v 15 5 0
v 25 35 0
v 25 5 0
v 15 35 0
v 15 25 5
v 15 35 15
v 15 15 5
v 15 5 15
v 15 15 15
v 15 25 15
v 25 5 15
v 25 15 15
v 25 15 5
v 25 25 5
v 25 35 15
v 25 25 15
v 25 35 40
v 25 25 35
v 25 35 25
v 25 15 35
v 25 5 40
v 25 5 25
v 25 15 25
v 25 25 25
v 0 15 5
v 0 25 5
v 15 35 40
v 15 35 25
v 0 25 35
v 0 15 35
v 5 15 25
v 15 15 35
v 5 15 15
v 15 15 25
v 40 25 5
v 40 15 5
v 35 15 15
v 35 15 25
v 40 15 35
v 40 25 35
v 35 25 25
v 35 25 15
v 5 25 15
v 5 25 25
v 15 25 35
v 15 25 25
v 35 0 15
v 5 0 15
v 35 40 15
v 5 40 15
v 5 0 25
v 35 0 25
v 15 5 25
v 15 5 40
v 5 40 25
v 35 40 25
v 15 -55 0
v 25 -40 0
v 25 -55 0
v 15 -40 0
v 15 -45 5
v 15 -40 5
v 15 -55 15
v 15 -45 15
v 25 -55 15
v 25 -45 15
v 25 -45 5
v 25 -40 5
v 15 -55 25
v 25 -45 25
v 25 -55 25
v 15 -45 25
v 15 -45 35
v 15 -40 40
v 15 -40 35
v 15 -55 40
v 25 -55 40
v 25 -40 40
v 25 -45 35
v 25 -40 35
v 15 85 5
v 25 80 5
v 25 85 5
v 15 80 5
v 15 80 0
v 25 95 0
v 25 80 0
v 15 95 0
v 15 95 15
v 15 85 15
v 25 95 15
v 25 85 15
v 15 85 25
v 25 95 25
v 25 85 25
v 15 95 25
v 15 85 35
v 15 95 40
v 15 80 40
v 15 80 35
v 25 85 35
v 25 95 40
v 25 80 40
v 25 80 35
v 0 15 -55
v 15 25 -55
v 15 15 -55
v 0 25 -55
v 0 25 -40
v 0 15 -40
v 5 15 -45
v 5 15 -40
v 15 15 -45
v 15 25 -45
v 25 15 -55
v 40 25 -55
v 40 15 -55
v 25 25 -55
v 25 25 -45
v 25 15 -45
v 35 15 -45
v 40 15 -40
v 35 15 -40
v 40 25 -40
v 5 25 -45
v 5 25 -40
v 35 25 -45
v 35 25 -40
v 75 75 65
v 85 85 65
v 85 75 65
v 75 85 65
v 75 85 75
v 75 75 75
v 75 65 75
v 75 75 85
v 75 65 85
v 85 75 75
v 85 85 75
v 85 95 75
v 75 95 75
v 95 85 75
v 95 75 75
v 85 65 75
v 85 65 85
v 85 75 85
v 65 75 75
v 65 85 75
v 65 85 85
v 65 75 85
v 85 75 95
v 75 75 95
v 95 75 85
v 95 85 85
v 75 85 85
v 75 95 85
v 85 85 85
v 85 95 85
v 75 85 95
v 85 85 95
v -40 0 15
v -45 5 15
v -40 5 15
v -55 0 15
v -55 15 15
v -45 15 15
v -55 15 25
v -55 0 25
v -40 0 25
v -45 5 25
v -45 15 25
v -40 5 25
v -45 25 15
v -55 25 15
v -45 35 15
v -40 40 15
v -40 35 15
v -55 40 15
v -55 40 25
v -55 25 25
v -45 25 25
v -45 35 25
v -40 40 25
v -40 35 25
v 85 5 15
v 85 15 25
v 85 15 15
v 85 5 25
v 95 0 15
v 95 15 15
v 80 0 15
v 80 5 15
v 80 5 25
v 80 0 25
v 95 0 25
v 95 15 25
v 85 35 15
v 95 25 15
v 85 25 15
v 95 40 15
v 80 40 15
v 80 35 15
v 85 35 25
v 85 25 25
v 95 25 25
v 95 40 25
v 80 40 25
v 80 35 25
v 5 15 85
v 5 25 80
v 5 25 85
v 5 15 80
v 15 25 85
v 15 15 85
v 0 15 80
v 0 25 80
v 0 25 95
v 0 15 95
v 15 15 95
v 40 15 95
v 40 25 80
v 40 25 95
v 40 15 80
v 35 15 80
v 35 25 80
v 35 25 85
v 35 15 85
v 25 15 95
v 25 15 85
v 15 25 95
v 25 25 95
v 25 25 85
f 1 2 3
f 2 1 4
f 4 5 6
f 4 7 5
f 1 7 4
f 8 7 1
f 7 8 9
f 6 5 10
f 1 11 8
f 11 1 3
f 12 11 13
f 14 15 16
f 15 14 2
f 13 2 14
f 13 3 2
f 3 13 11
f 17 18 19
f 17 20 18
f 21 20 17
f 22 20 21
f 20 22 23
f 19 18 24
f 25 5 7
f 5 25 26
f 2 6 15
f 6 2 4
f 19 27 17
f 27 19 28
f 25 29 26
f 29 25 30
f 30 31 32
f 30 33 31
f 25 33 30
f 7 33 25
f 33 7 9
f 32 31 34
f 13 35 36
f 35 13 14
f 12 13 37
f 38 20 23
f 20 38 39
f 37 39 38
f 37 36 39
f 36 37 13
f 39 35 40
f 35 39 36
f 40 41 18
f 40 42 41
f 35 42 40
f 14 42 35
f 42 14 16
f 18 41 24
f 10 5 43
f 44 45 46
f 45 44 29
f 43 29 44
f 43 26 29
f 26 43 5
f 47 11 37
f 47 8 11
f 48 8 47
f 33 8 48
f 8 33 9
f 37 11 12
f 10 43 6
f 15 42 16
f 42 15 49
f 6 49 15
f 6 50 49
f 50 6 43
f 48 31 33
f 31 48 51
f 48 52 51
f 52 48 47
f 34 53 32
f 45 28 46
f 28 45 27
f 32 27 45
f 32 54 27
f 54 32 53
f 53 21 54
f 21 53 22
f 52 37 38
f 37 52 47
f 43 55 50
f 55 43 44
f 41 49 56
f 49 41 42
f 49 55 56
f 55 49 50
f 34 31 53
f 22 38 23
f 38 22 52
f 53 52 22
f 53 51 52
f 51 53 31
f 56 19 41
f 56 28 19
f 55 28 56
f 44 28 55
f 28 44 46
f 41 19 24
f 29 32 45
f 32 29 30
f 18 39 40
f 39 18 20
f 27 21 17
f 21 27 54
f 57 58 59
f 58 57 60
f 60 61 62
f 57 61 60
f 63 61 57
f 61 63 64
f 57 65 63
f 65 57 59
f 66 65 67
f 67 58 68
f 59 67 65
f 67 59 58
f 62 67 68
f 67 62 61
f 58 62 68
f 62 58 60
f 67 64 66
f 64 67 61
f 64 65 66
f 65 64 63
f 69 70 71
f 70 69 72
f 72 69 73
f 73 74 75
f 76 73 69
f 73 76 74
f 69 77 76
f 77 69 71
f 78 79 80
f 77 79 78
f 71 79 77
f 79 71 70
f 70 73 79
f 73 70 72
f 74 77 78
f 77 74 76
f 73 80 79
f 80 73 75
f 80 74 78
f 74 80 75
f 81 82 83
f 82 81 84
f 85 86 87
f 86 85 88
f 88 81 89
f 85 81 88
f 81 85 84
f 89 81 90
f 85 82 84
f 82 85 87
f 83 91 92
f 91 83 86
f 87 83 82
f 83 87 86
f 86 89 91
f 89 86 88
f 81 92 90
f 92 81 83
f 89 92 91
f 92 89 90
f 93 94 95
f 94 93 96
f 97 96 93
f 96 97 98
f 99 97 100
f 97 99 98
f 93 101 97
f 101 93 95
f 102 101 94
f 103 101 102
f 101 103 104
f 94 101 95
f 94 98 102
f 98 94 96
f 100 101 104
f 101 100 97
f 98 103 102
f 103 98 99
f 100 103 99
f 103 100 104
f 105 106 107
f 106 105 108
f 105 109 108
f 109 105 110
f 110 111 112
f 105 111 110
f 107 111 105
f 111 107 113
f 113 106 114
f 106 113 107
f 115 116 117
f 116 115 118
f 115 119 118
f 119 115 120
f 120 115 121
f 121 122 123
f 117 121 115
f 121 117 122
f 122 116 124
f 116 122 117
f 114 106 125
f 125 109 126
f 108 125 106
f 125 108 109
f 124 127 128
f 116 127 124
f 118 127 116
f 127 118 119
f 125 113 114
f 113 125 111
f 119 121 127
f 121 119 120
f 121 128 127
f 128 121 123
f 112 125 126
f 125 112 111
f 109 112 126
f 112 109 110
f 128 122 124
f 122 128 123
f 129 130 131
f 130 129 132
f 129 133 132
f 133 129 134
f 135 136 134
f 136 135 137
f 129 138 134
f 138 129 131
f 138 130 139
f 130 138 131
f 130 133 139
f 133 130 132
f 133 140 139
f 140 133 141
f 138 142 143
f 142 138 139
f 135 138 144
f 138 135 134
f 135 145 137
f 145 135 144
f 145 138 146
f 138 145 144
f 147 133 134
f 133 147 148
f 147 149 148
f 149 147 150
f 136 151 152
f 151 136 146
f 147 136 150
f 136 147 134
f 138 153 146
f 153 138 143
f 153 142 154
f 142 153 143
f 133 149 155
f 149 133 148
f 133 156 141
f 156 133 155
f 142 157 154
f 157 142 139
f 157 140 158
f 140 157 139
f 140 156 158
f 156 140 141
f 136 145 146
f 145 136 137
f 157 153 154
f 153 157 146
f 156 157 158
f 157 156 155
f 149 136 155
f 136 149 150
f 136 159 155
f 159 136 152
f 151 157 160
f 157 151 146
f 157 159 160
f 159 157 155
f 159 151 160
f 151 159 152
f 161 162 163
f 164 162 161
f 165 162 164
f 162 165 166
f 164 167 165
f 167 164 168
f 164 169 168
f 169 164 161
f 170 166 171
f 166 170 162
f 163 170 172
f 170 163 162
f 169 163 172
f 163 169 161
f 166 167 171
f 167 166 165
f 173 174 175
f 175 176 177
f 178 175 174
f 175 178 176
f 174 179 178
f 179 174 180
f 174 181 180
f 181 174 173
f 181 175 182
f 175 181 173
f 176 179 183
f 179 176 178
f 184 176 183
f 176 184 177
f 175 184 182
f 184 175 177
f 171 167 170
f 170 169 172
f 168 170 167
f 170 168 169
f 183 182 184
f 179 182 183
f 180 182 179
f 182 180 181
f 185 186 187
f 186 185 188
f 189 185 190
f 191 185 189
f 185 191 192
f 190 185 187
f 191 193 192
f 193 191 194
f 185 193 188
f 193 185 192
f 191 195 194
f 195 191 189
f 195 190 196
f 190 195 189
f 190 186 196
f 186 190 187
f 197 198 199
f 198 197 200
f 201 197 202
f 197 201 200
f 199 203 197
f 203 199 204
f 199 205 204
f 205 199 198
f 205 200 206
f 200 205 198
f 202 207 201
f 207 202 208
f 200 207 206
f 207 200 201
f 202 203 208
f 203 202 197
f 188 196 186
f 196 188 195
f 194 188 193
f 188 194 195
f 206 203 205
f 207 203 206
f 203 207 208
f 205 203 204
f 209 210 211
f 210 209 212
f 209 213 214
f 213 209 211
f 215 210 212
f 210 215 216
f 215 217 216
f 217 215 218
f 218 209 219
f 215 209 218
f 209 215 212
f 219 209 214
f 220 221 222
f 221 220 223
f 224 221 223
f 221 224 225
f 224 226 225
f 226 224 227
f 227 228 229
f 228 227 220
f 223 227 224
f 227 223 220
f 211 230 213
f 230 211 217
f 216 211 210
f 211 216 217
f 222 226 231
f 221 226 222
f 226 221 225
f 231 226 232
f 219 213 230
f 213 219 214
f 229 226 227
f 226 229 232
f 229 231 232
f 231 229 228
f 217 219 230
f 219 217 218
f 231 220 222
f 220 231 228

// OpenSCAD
// SCAD file for Six Piece Burr Puzzle
// 整体模型
union() {
  translate([15, 5, 0]) color([0, 0.8, 0, 0.85]) cube([5, 5, 5]);
  translate([20, 5, 0]) color([0, 0.8, 0, 0.85]) cube([5, 5, 5]);
  translate([15, 10, 0]) color([0, 0.8, 0, 0.85]) cube([5, 5, 5]);
  translate([20, 10, 0]) color([0, 0.8, 0, 0.85]) cube([5, 5, 5]);
  translate([15, 15, 0]) color([0, 0.8, 0, 0.85]) cube([5, 5, 5]);
  translate([20, 15, 0]) color([0, 0.8, 0, 0.85]) cube([5, 5, 5]);
  translate([15, 20, 0]) color([1, 0, 0, 0.85]) cube([5, 5, 5]);
  translate([20, 20, 0]) color([1, 0, 0, 0.85]) cube([5, 5, 5]);
  translate([15, 25, 0]) color([1, 0, 0, 0.85]) cube([5, 5, 5]);
  translate([20, 25, 0]) color([1, 0, 0, 0.85]) cube([5, 5, 5]);
  translate([15, 30, 0]) color([1, 0, 0, 0.85]) cube([5, 5, 5]);
  translate([20, 30, 0]) color([1, 0, 0, 0.85]) cube([5, 5, 5]);
  translate([15, 5, 5]) color([0, 0.8, 0, 0.85]) cube([5, 5, 5]);
  translate([20, 5, 5]) color([0, 0.8, 0, 0.85]) cube([5, 5, 5]);
  translate([15, 10, 5]) color([0, 0.8, 0, 0.85]) cube([5, 5, 5]);
  translate([20, 10, 5]) color([0, 0.8, 0, 0.85]) cube([5, 5, 5]);
  translate([0, 15, 5]) color([1, 0.8, 0, 0.85]) cube([5, 5, 5]);
  translate([5, 15, 5]) color([1, 0.8, 0, 0.85]) cube([5, 5, 5]);
  translate([10, 15, 5]) color([1, 0.8, 0, 0.85]) cube([5, 5, 5]);
  translate([15, 15, 5]) color([0.8, 0.8, 0.8, 0.85]) cube([5, 5, 5]);
  translate([20, 15, 5]) color([0.8, 0.8, 0.8, 0.85]) cube([5, 5, 5]);
  translate([25, 15, 5]) color([1, 0.8, 0, 0.85]) cube([5, 5, 5]);
  translate([30, 15, 5]) color([1, 0.8, 0, 0.85]) cube([5, 5, 5]);
  translate([35, 15, 5]) color([1, 0.8, 0, 0.85]) cube([5, 5, 5]);
  translate([0, 20, 5]) color([1, 0.8, 0, 0.85]) cube([5, 5, 5]);
  translate([5, 20, 5]) color([1, 0.8, 0, 0.85]) cube([5, 5, 5]);
  translate([10, 20, 5]) color([1, 0.8, 0, 0.85]) cube([5, 5, 5]);
  translate([15, 20, 5]) color([0.8, 0.8, 0.8, 0.85]) cube([5, 5, 5]);
  translate([20, 20, 5]) color([0.8, 0.8, 0.8, 0.85]) cube([5, 5, 5]);
  translate([25, 20, 5]) color([1, 0.8, 0, 0.85]) cube([5, 5, 5]);
  translate([30, 20, 5]) color([1, 0.8, 0, 0.85]) cube([5, 5, 5]);
  translate([35, 20, 5]) color([1, 0.8, 0, 0.85]) cube([5, 5, 5]);
  translate([15, 25, 5]) color([1, 0, 0, 0.85]) cube([5, 5, 5]);
  translate([20, 25, 5]) color([1, 0, 0, 0.85]) cube([5, 5, 5]);
  translate([15, 30, 5]) color([1, 0, 0, 0.85]) cube([5, 5, 5]);
  translate([20, 30, 5]) color([1, 0, 0, 0.85]) cube([5, 5, 5]);
  translate([15, 5, 10]) color([0, 0.8, 0, 0.85]) cube([5, 5, 5]);
  translate([20, 5, 10]) color([0, 0.8, 0, 0.85]) cube([5, 5, 5]);
  translate([15, 10, 10]) color([0, 0.8, 0, 0.85]) cube([5, 5, 5]);
  translate([20, 10, 10]) color([0, 0.8, 0, 0.85]) cube([5, 5, 5]);
  translate([0, 15, 10]) color([1, 0.8, 0, 0.85]) cube([5, 5, 5]);
  translate([5, 15, 10]) color([1, 0.8, 0, 0.85]) cube([5, 5, 5]);
  translate([10, 15, 10]) color([1, 0.8, 0, 0.85]) cube([5, 5, 5]);
  translate([15, 15, 10]) color([0.8, 0.8, 0.8, 0.85]) cube([5, 5, 5]);
  translate([20, 15, 10]) color([0.8, 0.8, 0.8, 0.85]) cube([5, 5, 5]);
  translate([25, 15, 10]) color([1, 0.8, 0, 0.85]) cube([5, 5, 5]);
  translate([30, 15, 10]) color([1, 0.8, 0, 0.85]) cube([5, 5, 5]);
  translate([35, 15, 10]) color([1, 0.8, 0, 0.85]) cube([5, 5, 5]);
  translate([0, 20, 10]) color([1, 0.8, 0, 0.85]) cube([5, 5, 5]);
  translate([5, 20, 10]) color([1, 0.8, 0, 0.85]) cube([5, 5, 5]);
  translate([10, 20, 10]) color([1, 0.8, 0, 0.85]) cube([5, 5, 5]);
  translate([15, 20, 10]) color([0.8, 0.8, 0.8, 0.85]) cube([5, 5, 5]);
  translate([20, 20, 10]) color([0.8, 0.8, 0.8, 0.85]) cube([5, 5, 5]);
  translate([25, 20, 10]) color([1, 0.8, 0, 0.85]) cube([5, 5, 5]);
  translate([30, 20, 10]) color([1, 0.8, 0, 0.85]) cube([5, 5, 5]);
  translate([35, 20, 10]) color([1, 0.8, 0, 0.85]) cube([5, 5, 5]);
  translate([15, 25, 10]) color([1, 0, 0, 0.85]) cube([5, 5, 5]);
  translate([20, 25, 10]) color([1, 0, 0, 0.85]) cube([5, 5, 5]);
  translate([15, 30, 10]) color([1, 0, 0, 0.85]) cube([5, 5, 5]);
  translate([20, 30, 10]) color([1, 0, 0, 0.85]) cube([5, 5, 5]);
  translate([5, 0, 15]) color([0.6, 0, 1, 0.85]) cube([5, 5, 5]);
  translate([10, 0, 15]) color([0.6, 0, 1, 0.85]) cube([5, 5, 5]);
  translate([15, 0, 15]) color([0.6, 0, 1, 0.85]) cube([5, 5, 5]);
  translate([20, 0, 15]) color([1, 0.4, 0, 0.85]) cube([5, 5, 5]);
  translate([25, 0, 15]) color([1, 0.4, 0, 0.85]) cube([5, 5, 5]);
  translate([30, 0, 15]) color([1, 0.4, 0, 0.85]) cube([5, 5, 5]);
  translate([5, 5, 15]) color([0.6, 0, 1, 0.85]) cube([5, 5, 5]);
  translate([10, 5, 15]) color([0.6, 0, 1, 0.85]) cube([5, 5, 5]);
  translate([15, 5, 15]) color([0.8, 0.8, 0.8, 0.85]) cube([5, 5, 5]);
  translate([20, 5, 15]) color([0.8, 0.8, 0.8, 0.85]) cube([5, 5, 5]);
  translate([25, 5, 15]) color([1, 0.4, 0, 0.85]) cube([5, 5, 5]);
  translate([30, 5, 15]) color([1, 0.4, 0, 0.85]) cube([5, 5, 5]);
  translate([5, 10, 15]) color([0.6, 0, 1, 0.85]) cube([5, 5, 5]);
  translate([10, 10, 15]) color([0.6, 0, 1, 0.85]) cube([5, 5, 5]);
  translate([15, 10, 15]) color([0.8, 0.8, 0.8, 0.85]) cube([5, 5, 5]);
  translate([20, 10, 15]) color([0.8, 0.8, 0.8, 0.85]) cube([5, 5, 5]);
  translate([25, 10, 15]) color([1, 0.4, 0, 0.85]) cube([5, 5, 5]);
  translate([30, 10, 15]) color([1, 0.4, 0, 0.85]) cube([5, 5, 5]);
  translate([0, 15, 15]) color([1, 0.8, 0, 0.85]) cube([5, 5, 5]);
  translate([5, 15, 15]) color([0.8, 0.8, 0.8, 0.85]) cube([5, 5, 5]);
  translate([10, 15, 15]) color([0.8, 0.8, 0.8, 0.85]) cube([5, 5, 5]);
  translate([15, 15, 15]) color([0.8, 0.8, 0.8, 0.85]) cube([5, 5, 5]);
  translate([20, 15, 15]) color([0.8, 0.8, 0.8, 0.85]) cube([5, 5, 5]);
  translate([25, 15, 15]) color([0.8, 0.8, 0.8, 0.85]) cube([5, 5, 5]);
  translate([30, 15, 15]) color([0.8, 0.8, 0.8, 0.85]) cube([5, 5, 5]);
  translate([35, 15, 15]) color([1, 0.8, 0, 0.85]) cube([5, 5, 5]);
  translate([0, 20, 15]) color([1, 0.8, 0, 0.85]) cube([5, 5, 5]);
  translate([5, 20, 15]) color([0.8, 0.8, 0.8, 0.85]) cube([5, 5, 5]);
  translate([10, 20, 15]) color([0.8, 0.8, 0.8, 0.85]) cube([5, 5, 5]);
  translate([15, 20, 15]) color([0.8, 0.8, 0.8, 0.85]) cube([5, 5, 5]);
  translate([20, 20, 15]) color([0.8, 0.8, 0.8, 0.85]) cube([5, 5, 5]);
  translate([25, 20, 15]) color([0.8, 0.8, 0.8, 0.85]) cube([5, 5, 5]);
  translate([30, 20, 15]) color([0.8, 0.8, 0.8, 0.85]) cube([5, 5, 5]);
  translate([35, 20, 15]) color([1, 0.8, 0, 0.85]) cube([5, 5, 5]);
  translate([5, 25, 15]) color([0.6, 0, 1, 0.85]) cube([5, 5, 5]);
  translate([10, 25, 15]) color([0.6, 0, 1, 0.85]) cube([5, 5, 5]);
  translate([15, 25, 15]) color([0.8, 0.8, 0.8, 0.85]) cube([5, 5, 5]);
  translate([20, 25, 15]) color([0.8, 0.8, 0.8, 0.85]) cube([5, 5, 5]);
  translate([25, 25, 15]) color([1, 0.4, 0, 0.85]) cube([5, 5, 5]);
  translate([30, 25, 15]) color([1, 0.4, 0, 0.85]) cube([5, 5, 5]);
  translate([5, 30, 15]) color([0.6, 0, 1, 0.85]) cube([5, 5, 5]);
  translate([10, 30, 15]) color([0.6, 0, 1, 0.85]) cube([5, 5, 5]);
  translate([15, 30, 15]) color([0.8, 0.8, 0.8, 0.85]) cube([5, 5, 5]);
  translate([20, 30, 15]) color([0.8, 0.8, 0.8, 0.85]) cube([5, 5, 5]);
  translate([25, 30, 15]) color([1, 0.4, 0, 0.85]) cube([5, 5, 5]);
  translate([30, 30, 15]) color([1, 0.4, 0, 0.85]) cube([5, 5, 5]);
  translate([5, 35, 15]) color([0.6, 0, 1, 0.85]) cube([5, 5, 5]);
  translate([10, 35, 15]) color([0.6, 0, 1, 0.85]) cube([5, 5, 5]);
  translate([15, 35, 15]) color([0.6, 0, 1, 0.85]) cube([5, 5, 5]);
  translate([20, 35, 15]) color([1, 0.4, 0, 0.85]) cube([5, 5, 5]);
  translate([25, 35, 15]) color([1, 0.4, 0, 0.85]) cube([5, 5, 5]);
  translate([30, 35, 15]) color([1, 0.4, 0, 0.85]) cube([5, 5, 5]);
  translate([5, 0, 20]) color([0.6, 0, 1, 0.85]) cube([5, 5, 5]);
  translate([10, 0, 20]) color([0.6, 0, 1, 0.85]) cube([5, 5, 5]);
  translate([15, 0, 20]) color([0.6, 0, 1, 0.85]) cube([5, 5, 5]);
  translate([20, 0, 20]) color([1, 0.4, 0, 0.85]) cube([5, 5, 5]);
  translate([25, 0, 20]) color([1, 0.4, 0, 0.85]) cube([5, 5, 5]);
  translate([30, 0, 20]) color([1, 0.4, 0, 0.85]) cube([5, 5, 5]);
  translate([5, 5, 20]) color([0.6, 0, 1, 0.85]) cube([5, 5, 5]);
  translate([10, 5, 20]) color([0.6, 0, 1, 0.85]) cube([5, 5, 5]);
  translate([15, 5, 20]) color([0.8, 0.8, 0.8, 0.85]) cube([5, 5, 5]);
  translate([20, 5, 20]) color([0.8, 0.8, 0.8, 0.85]) cube([5, 5, 5]);
  translate([25, 5, 20]) color([1, 0.4, 0, 0.85]) cube([5, 5, 5]);
  translate([30, 5, 20]) color([1, 0.4, 0, 0.85]) cube([5, 5, 5]);
  translate([5, 10, 20]) color([0.6, 0, 1, 0.85]) cube([5, 5, 5]);
  translate([10, 10, 20]) color([0.6, 0, 1, 0.85]) cube([5, 5, 5]);
  translate([15, 10, 20]) color([0.8, 0.8, 0.8, 0.85]) cube([5, 5, 5]);
  translate([20, 10, 20]) color([0.8, 0.8, 0.8, 0.85]) cube([5, 5, 5]);
  translate([25, 10, 20]) color([1, 0.4, 0, 0.85]) cube([5, 5, 5]);
  translate([30, 10, 20]) color([1, 0.4, 0, 0.85]) cube([5, 5, 5]);
  translate([0, 15, 20]) color([0, 0.4, 1, 0.85]) cube([5, 5, 5]);
  translate([5, 15, 20]) color([0.8, 0.8, 0.8, 0.85]) cube([5, 5, 5]);
  translate([10, 15, 20]) color([0.8, 0.8, 0.8, 0.85]) cube([5, 5, 5]);
  translate([15, 15, 20]) color([0.8, 0.8, 0.8, 0.85]) cube([5, 5, 5]);
  translate([20, 15, 20]) color([0.8, 0.8, 0.8, 0.85]) cube([5, 5, 5]);
  translate([25, 15, 20]) color([0.8, 0.8, 0.8, 0.85]) cube([5, 5, 5]);
  translate([30, 15, 20]) color([0.8, 0.8, 0.8, 0.85]) cube([5, 5, 5]);
  translate([35, 15, 20]) color([0, 0.4, 1, 0.85]) cube([5, 5, 5]);
  translate([0, 20, 20]) color([0, 0.4, 1, 0.85]) cube([5, 5, 5]);
  translate([5, 20, 20]) color([0.8, 0.8, 0.8, 0.85]) cube([5, 5, 5]);
  translate([10, 20, 20]) color([0.8, 0.8, 0.8, 0.85]) cube([5, 5, 5]);
  translate([15, 20, 20]) color([0.8, 0.8, 0.8, 0.85]) cube([5, 5, 5]);
  translate([20, 20, 20]) color([0.8, 0.8, 0.8, 0.85]) cube([5, 5, 5]);
  translate([25, 20, 20]) color([0.8, 0.8, 0.8, 0.85]) cube([5, 5, 5]);
  translate([30, 20, 20]) color([0.8, 0.8, 0.8, 0.85]) cube([5, 5, 5]);
  translate([35, 20, 20]) color([0, 0.4, 1, 0.85]) cube([5, 5, 5]);
  translate([5, 25, 20]) color([0.6, 0, 1, 0.85]) cube([5, 5, 5]);
  translate([10, 25, 20]) color([0.6, 0, 1, 0.85]) cube([5, 5, 5]);
  translate([15, 25, 20]) color([0.8, 0.8, 0.8, 0.85]) cube([5, 5, 5]);
  translate([20, 25, 20]) color([0.8, 0.8, 0.8, 0.85]) cube([5, 5, 5]);
  translate([25, 25, 20]) color([1, 0.4, 0, 0.85]) cube([5, 5, 5]);
  translate([30, 25, 20]) color([1, 0.4, 0, 0.85]) cube([5, 5, 5]);
  translate([5, 30, 20]) color([0.6, 0, 1, 0.85]) cube([5, 5, 5]);
  translate([10, 30, 20]) color([0.6, 0, 1, 0.85]) cube([5, 5, 5]);
  translate([15, 30, 20]) color([0.8, 0.8, 0.8, 0.85]) cube([5, 5, 5]);
  translate([20, 30, 20]) color([0.8, 0.8, 0.8, 0.85]) cube([5, 5, 5]);
  translate([25, 30, 20]) color([1, 0.4, 0, 0.85]) cube([5, 5, 5]);
  translate([30, 30, 20]) color([1, 0.4, 0, 0.85]) cube([5, 5, 5]);
  translate([5, 35, 20]) color([0.6, 0, 1, 0.85]) cube([5, 5, 5]);
  translate([10, 35, 20]) color([0.6, 0, 1, 0.85]) cube([5, 5, 5]);
  translate([15, 35, 20]) color([0.6, 0, 1, 0.85]) cube([5, 5, 5]);
  translate([20, 35, 20]) color([1, 0.4, 0, 0.85]) cube([5, 5, 5]);
  translate([25, 35, 20]) color([1, 0.4, 0, 0.85]) cube([5, 5, 5]);
  translate([30, 35, 20]) color([1, 0.4, 0, 0.85]) cube([5, 5, 5]);
  translate([15, 5, 25]) color([0, 0.8, 0, 0.85]) cube([5, 5, 5]);
  translate([20, 5, 25]) color([0, 0.8, 0, 0.85]) cube([5, 5, 5]);
  translate([15, 10, 25]) color([0, 0.8, 0, 0.85]) cube([5, 5, 5]);
  translate([20, 10, 25]) color([0, 0.8, 0, 0.85]) cube([5, 5, 5]);
  translate([0, 15, 25]) color([0, 0.4, 1, 0.85]) cube([5, 5, 5]);
  translate([5, 15, 25]) color([0, 0.4, 1, 0.85]) cube([5, 5, 5]);
  translate([10, 15, 25]) color([0, 0.4, 1, 0.85]) cube([5, 5, 5]);
  translate([15, 15, 25]) color([0.8, 0.8, 0.8, 0.85]) cube([5, 5, 5]);
  translate([20, 15, 25]) color([0.8, 0.8, 0.8, 0.85]) cube([5, 5, 5]);
  translate([25, 15, 25]) color([0, 0.4, 1, 0.85]) cube([5, 5, 5]);
  translate([30, 15, 25]) color([0, 0.4, 1, 0.85]) cube([5, 5, 5]);
  translate([35, 15, 25]) color([0, 0.4, 1, 0.85]) cube([5, 5, 5]);
  translate([0, 20, 25]) color([0, 0.4, 1, 0.85]) cube([5, 5, 5]);
  translate([5, 20, 25]) color([0, 0.4, 1, 0.85]) cube([5, 5, 5]);
  translate([10, 20, 25]) color([0, 0.4, 1, 0.85]) cube([5, 5, 5]);
  translate([15, 20, 25]) color([0.8, 0.8, 0.8, 0.85]) cube([5, 5, 5]);
  translate([20, 20, 25]) color([0.8, 0.8, 0.8, 0.85]) cube([5, 5, 5]);
  translate([25, 20, 25]) color([0, 0.4, 1, 0.85]) cube([5, 5, 5]);
  translate([30, 20, 25]) color([0, 0.4, 1, 0.85]) cube([5, 5, 5]);
  translate([35, 20, 25]) color([0, 0.4, 1, 0.85]) cube([5, 5, 5]);
  translate([15, 25, 25]) color([1, 0, 0, 0.85]) cube([5, 5, 5]);
  translate([20, 25, 25]) color([1, 0, 0, 0.85]) cube([5, 5, 5]);
  translate([15, 30, 25]) color([1, 0, 0, 0.85]) cube([5, 5, 5]);
  translate([20, 30, 25]) color([1, 0, 0, 0.85]) cube([5, 5, 5]);
  translate([15, 5, 30]) color([0, 0.8, 0, 0.85]) cube([5, 5, 5]);
  translate([20, 5, 30]) color([0, 0.8, 0, 0.85]) cube([5, 5, 5]);
  translate([15, 10, 30]) color([0, 0.8, 0, 0.85]) cube([5, 5, 5]);
  translate([20, 10, 30]) color([0, 0.8, 0, 0.85]) cube([5, 5, 5]);
  translate([0, 15, 30]) color([0, 0.4, 1, 0.85]) cube([5, 5, 5]);
  translate([5, 15, 30]) color([0, 0.4, 1, 0.85]) cube([5, 5, 5]);
  translate([10, 15, 30]) color([0, 0.4, 1, 0.85]) cube([5, 5, 5]);
  translate([15, 15, 30]) color([0.8, 0.8, 0.8, 0.85]) cube([5, 5, 5]);
  translate([20, 15, 30]) color([0.8, 0.8, 0.8, 0.85]) cube([5, 5, 5]);
  translate([25, 15, 30]) color([0, 0.4, 1, 0.85]) cube([5, 5, 5]);
  translate([30, 15, 30]) color([0, 0.4, 1, 0.85]) cube([5, 5, 5]);
  translate([35, 15, 30]) color([0, 0.4, 1, 0.85]) cube([5, 5, 5]);
  translate([0, 20, 30]) color([0, 0.4, 1, 0.85]) cube([5, 5, 5]);
  translate([5, 20, 30]) color([0, 0.4, 1, 0.85]) cube([5, 5, 5]);
  translate([10, 20, 30]) color([0, 0.4, 1, 0.85]) cube([5, 5, 5]);
  translate([15, 20, 30]) color([0.8, 0.8, 0.8, 0.85]) cube([5, 5, 5]);
  translate([20, 20, 30]) color([0.8, 0.8, 0.8, 0.85]) cube([5, 5, 5]);
  translate([25, 20, 30]) color([0, 0.4, 1, 0.85]) cube([5, 5, 5]);
  translate([30, 20, 30]) color([0, 0.4, 1, 0.85]) cube([5, 5, 5]);
  translate([35, 20, 30]) color([0, 0.4, 1, 0.85]) cube([5, 5, 5]);
  translate([15, 25, 30]) color([1, 0, 0, 0.85]) cube([5, 5, 5]);
  translate([20, 25, 30]) color([1, 0, 0, 0.85]) cube([5, 5, 5]);
  translate([15, 30, 30]) color([1, 0, 0, 0.85]) cube([5, 5, 5]);
  translate([20, 30, 30]) color([1, 0, 0, 0.85]) cube([5, 5, 5]);
  translate([15, 5, 35]) color([0, 0.8, 0, 0.85]) cube([5, 5, 5]);
  translate([20, 5, 35]) color([0, 0.8, 0, 0.85]) cube([5, 5, 5]);
  translate([15, 10, 35]) color([0, 0.8, 0, 0.85]) cube([5, 5, 5]);
  translate([20, 10, 35]) color([0, 0.8, 0, 0.85]) cube([5, 5, 5]);
  translate([15, 15, 35]) color([0, 0.8, 0, 0.85]) cube([5, 5, 5]);
  translate([20, 15, 35]) color([0, 0.8, 0, 0.85]) cube([5, 5, 5]);
  translate([15, 20, 35]) color([1, 0, 0, 0.85]) cube([5, 5, 5]);
  translate([20, 20, 35]) color([1, 0, 0, 0.85]) cube([5, 5, 5]);
  translate([15, 25, 35]) color([1, 0, 0, 0.85]) cube([5, 5, 5]);
  translate([20, 25, 35]) color([1, 0, 0, 0.85]) cube([5, 5, 5]);
  translate([15, 30, 35]) color([1, 0, 0, 0.85]) cube([5, 5, 5]);
  translate([20, 30, 35]) color([1, 0, 0, 0.85]) cube([5, 5, 5]);
}

// 零件 B
union() {
  translate([15.0, -55.0, 0.0]) color([0, 0.8, 0, 0.85]) cube([5, 5, 5]);
  translate([20.0, -55.0, 0.0]) color([0, 0.8, 0, 0.85]) cube([5, 5, 5]);
  translate([15.0, -50.0, 0.0]) color([0, 0.8, 0, 0.85]) cube([5, 5, 5]);
  translate([20.0, -50.0, 0.0]) color([0, 0.8, 0, 0.85]) cube([5, 5, 5]);
  translate([15.0, -45.0, 0.0]) color([0, 0.8, 0, 0.85]) cube([5, 5, 5]);
  translate([20.0, -45.0, 0.0]) color([0, 0.8, 0, 0.85]) cube([5, 5, 5]);
  translate([15.0, -55.0, 5.0]) color([0, 0.8, 0, 0.85]) cube([5, 5, 5]);
  translate([20.0, -55.0, 5.0]) color([0, 0.8, 0, 0.85]) cube([5, 5, 5]);
  translate([15.0, -50.0, 5.0]) color([0, 0.8, 0, 0.85]) cube([5, 5, 5]);
  translate([20.0, -50.0, 5.0]) color([0, 0.8, 0, 0.85]) cube([5, 5, 5]);
  translate([15.0, -55.0, 10.0]) color([0, 0.8, 0, 0.85]) cube([5, 5, 5]);
  translate([20.0, -55.0, 10.0]) color([0, 0.8, 0, 0.85]) cube([5, 5, 5]);
  translate([15.0, -50.0, 10.0]) color([0, 0.8, 0, 0.85]) cube([5, 5, 5]);
  translate([20.0, -50.0, 10.0]) color([0, 0.8, 0, 0.85]) cube([5, 5, 5]);
  translate([15.0, -55.0, 25.0]) color([0, 0.8, 0, 0.85]) cube([5, 5, 5]);
  translate([20.0, -55.0, 25.0]) color([0, 0.8, 0, 0.85]) cube([5, 5, 5]);
  translate([15.0, -50.0, 25.0]) color([0, 0.8, 0, 0.85]) cube([5, 5, 5]);
  translate([20.0, -50.0, 25.0]) color([0, 0.8, 0, 0.85]) cube([5, 5, 5]);
  translate([15.0, -55.0, 30.0]) color([0, 0.8, 0, 0.85]) cube([5, 5, 5]);
  translate([20.0, -55.0, 30.0]) color([0, 0.8, 0, 0.85]) cube([5, 5, 5]);
  translate([15.0, -50.0, 30.0]) color([0, 0.8, 0, 0.85]) cube([5, 5, 5]);
  translate([20.0, -50.0, 30.0]) color([0, 0.8, 0, 0.85]) cube([5, 5, 5]);
  translate([15.0, -55.0, 35.0]) color([0, 0.8, 0, 0.85]) cube([5, 5, 5]);
  translate([20.0, -55.0, 35.0]) color([0, 0.8, 0, 0.85]) cube([5, 5, 5]);
  translate([15.0, -50.0, 35.0]) color([0, 0.8, 0, 0.85]) cube([5, 5, 5]);
  translate([20.0, -50.0, 35.0]) color([0, 0.8, 0, 0.85]) cube([5, 5, 5]);
  translate([15.0, -45.0, 35.0]) color([0, 0.8, 0, 0.85]) cube([5, 5, 5]);
  translate([20.0, -45.0, 35.0]) color([0, 0.8, 0, 0.85]) cube([5, 5, 5]);
}

// 零件 A
union() {
  translate([15.0, 80.0, 0.0]) color([1, 0, 0, 0.85]) cube([5, 5, 5]);
  translate([20.0, 80.0, 0.0]) color([1, 0, 0, 0.85]) cube([5, 5, 5]);
  translate([15.0, 85.0, 0.0]) color([1, 0, 0, 0.85]) cube([5, 5, 5]);
  translate([20.0, 85.0, 0.0]) color([1, 0, 0, 0.85]) cube([5, 5, 5]);
  translate([15.0, 90.0, 0.0]) color([1, 0, 0, 0.85]) cube([5, 5, 5]);
  translate([20.0, 90.0, 0.0]) color([1, 0, 0, 0.85]) cube([5, 5, 5]);
  translate([15.0, 85.0, 5.0]) color([1, 0, 0, 0.85]) cube([5, 5, 5]);
  translate([20.0, 85.0, 5.0]) color([1, 0, 0, 0.85]) cube([5, 5, 5]);
  translate([15.0, 90.0, 5.0]) color([1, 0, 0, 0.85]) cube([5, 5, 5]);
  translate([20.0, 90.0, 5.0]) color([1, 0, 0, 0.85]) cube([5, 5, 5]);
  translate([15.0, 85.0, 10.0]) color([1, 0, 0, 0.85]) cube([5, 5, 5]);
  translate([20.0, 85.0, 10.0]) color([1, 0, 0, 0.85]) cube([5, 5, 5]);
  translate([15.0, 90.0, 10.0]) color([1, 0, 0, 0.85]) cube([5, 5, 5]);
  translate([20.0, 90.0, 10.0]) color([1, 0, 0, 0.85]) cube([5, 5, 5]);
  translate([15.0, 85.0, 25.0]) color([1, 0, 0, 0.85]) cube([5, 5, 5]);
  translate([20.0, 85.0, 25.0]) color([1, 0, 0, 0.85]) cube([5, 5, 5]);
  translate([15.0, 90.0, 25.0]) color([1, 0, 0, 0.85]) cube([5, 5, 5]);
  translate([20.0, 90.0, 25.0]) color([1, 0, 0, 0.85]) cube([5, 5, 5]);
  translate([15.0, 85.0, 30.0]) color([1, 0, 0, 0.85]) cube([5, 5, 5]);
  translate([20.0, 85.0, 30.0]) color([1, 0, 0, 0.85]) cube([5, 5, 5]);
  translate([15.0, 90.0, 30.0]) color([1, 0, 0, 0.85]) cube([5, 5, 5]);
  translate([20.0, 90.0, 30.0]) color([1, 0, 0, 0.85]) cube([5, 5, 5]);
  translate([15.0, 80.0, 35.0]) color([1, 0, 0, 0.85]) cube([5, 5, 5]);
  translate([20.0, 80.0, 35.0]) color([1, 0, 0, 0.85]) cube([5, 5, 5]);
  translate([15.0, 85.0, 35.0]) color([1, 0, 0, 0.85]) cube([5, 5, 5]);
  translate([20.0, 85.0, 35.0]) color([1, 0, 0, 0.85]) cube([5, 5, 5]);
  translate([15.0, 90.0, 35.0]) color([1, 0, 0, 0.85]) cube([5, 5, 5]);
  translate([20.0, 90.0, 35.0]) color([1, 0, 0, 0.85]) cube([5, 5, 5]);
}

// 零件 D
union() {
  translate([0.0, 15.0, -55.0]) color([1, 0.8, 0, 0.85]) cube([5, 5, 5]);
  translate([5.0, 15.0, -55.0]) color([1, 0.8, 0, 0.85]) cube([5, 5, 5]);
  translate([10.0, 15.0, -55.0]) color([1, 0.8, 0, 0.85]) cube([5, 5, 5]);
  translate([25.0, 15.0, -55.0]) color([1, 0.8, 0, 0.85]) cube([5, 5, 5]);
  translate([30.0, 15.0, -55.0]) color([1, 0.8, 0, 0.85]) cube([5, 5, 5]);
  translate([35.0, 15.0, -55.0]) color([1, 0.8, 0, 0.85]) cube([5, 5, 5]);
  translate([0.0, 20.0, -55.0]) color([1, 0.8, 0, 0.85]) cube([5, 5, 5]);
  translate([5.0, 20.0, -55.0]) color([1, 0.8, 0, 0.85]) cube([5, 5, 5]);
  translate([10.0, 20.0, -55.0]) color([1, 0.8, 0, 0.85]) cube([5, 5, 5]);
  translate([25.0, 20.0, -55.0]) color([1, 0.8, 0, 0.85]) cube([5, 5, 5]);
  translate([30.0, 20.0, -55.0]) color([1, 0.8, 0, 0.85]) cube([5, 5, 5]);
  translate([35.0, 20.0, -55.0]) color([1, 0.8, 0, 0.85]) cube([5, 5, 5]);
  translate([0.0, 15.0, -50.0]) color([1, 0.8, 0, 0.85]) cube([5, 5, 5]);
  translate([5.0, 15.0, -50.0]) color([1, 0.8, 0, 0.85]) cube([5, 5, 5]);
  translate([10.0, 15.0, -50.0]) color([1, 0.8, 0, 0.85]) cube([5, 5, 5]);
  translate([25.0, 15.0, -50.0]) color([1, 0.8, 0, 0.85]) cube([5, 5, 5]);
  translate([30.0, 15.0, -50.0]) color([1, 0.8, 0, 0.85]) cube([5, 5, 5]);
  translate([35.0, 15.0, -50.0]) color([1, 0.8, 0, 0.85]) cube([5, 5, 5]);
  translate([0.0, 20.0, -50.0]) color([1, 0.8, 0, 0.85]) cube([5, 5, 5]);
  translate([5.0, 20.0, -50.0]) color([1, 0.8, 0, 0.85]) cube([5, 5, 5]);
  translate([10.0, 20.0, -50.0]) color([1, 0.8, 0, 0.85]) cube([5, 5, 5]);
  translate([25.0, 20.0, -50.0]) color([1, 0.8, 0, 0.85]) cube([5, 5, 5]);
  translate([30.0, 20.0, -50.0]) color([1, 0.8, 0, 0.85]) cube([5, 5, 5]);
  translate([35.0, 20.0, -50.0]) color([1, 0.8, 0, 0.85]) cube([5, 5, 5]);
  translate([0.0, 15.0, -45.0]) color([1, 0.8, 0, 0.85]) cube([5, 5, 5]);
  translate([35.0, 15.0, -45.0]) color([1, 0.8, 0, 0.85]) cube([5, 5, 5]);
  translate([0.0, 20.0, -45.0]) color([1, 0.8, 0, 0.85]) cube([5, 5, 5]);
  translate([35.0, 20.0, -45.0]) color([1, 0.8, 0, 0.85]) cube([5, 5, 5]);
}

// 零件 public
union() {
  translate([75.0, 75.0, 65.0]) color([0.8, 0.8, 0.8, 0.85]) cube([5, 5, 5]);
  translate([80.0, 75.0, 65.0]) color([0.8, 0.8, 0.8, 0.85]) cube([5, 5, 5]);
  translate([75.0, 80.0, 65.0]) color([0.8, 0.8, 0.8, 0.85]) cube([5, 5, 5]);
  translate([80.0, 80.0, 65.0]) color([0.8, 0.8, 0.8, 0.85]) cube([5, 5, 5]);
  translate([75.0, 75.0, 70.0]) color([0.8, 0.8, 0.8, 0.85]) cube([5, 5, 5]);
  translate([80.0, 75.0, 70.0]) color([0.8, 0.8, 0.8, 0.85]) cube([5, 5, 5]);
  translate([75.0, 80.0, 70.0]) color([0.8, 0.8, 0.8, 0.85]) cube([5, 5, 5]);
  translate([80.0, 80.0, 70.0]) color([0.8, 0.8, 0.8, 0.85]) cube([5, 5, 5]);
  translate([75.0, 65.0, 75.0]) color([0.8, 0.8, 0.8, 0.85]) cube([5, 5, 5]);
  translate([80.0, 65.0, 75.0]) color([0.8, 0.8, 0.8, 0.85]) cube([5, 5, 5]);
  translate([75.0, 70.0, 75.0]) color([0.8, 0.8, 0.8, 0.85]) cube([5, 5, 5]);
  translate([80.0, 70.0, 75.0]) color([0.8, 0.8, 0.8, 0.85]) cube([5, 5, 5]);
  translate([65.0, 75.0, 75.0]) color([0.8, 0.8, 0.8, 0.85]) cube([5, 5, 5]);
  translate([70.0, 75.0, 75.0]) color([0.8, 0.8, 0.8, 0.85]) cube([5, 5, 5]);
  translate([75.0, 75.0, 75.0]) color([0.8, 0.8, 0.8, 0.85]) cube([5, 5, 5]);
  translate([80.0, 75.0, 75.0]) color([0.8, 0.8, 0.8, 0.85]) cube([5, 5, 5]);
  translate([85.0, 75.0, 75.0]) color([0.8, 0.8, 0.8, 0.85]) cube([5, 5, 5]);
  translate([90.0, 75.0, 75.0]) color([0.8, 0.8, 0.8, 0.85]) cube([5, 5, 5]);
  translate([65.0, 80.0, 75.0]) color([0.8, 0.8, 0.8, 0.85]) cube([5, 5, 5]);
  translate([70.0, 80.0, 75.0]) color([0.8, 0.8, 0.8, 0.85]) cube([5, 5, 5]);
  translate([75.0, 80.0, 75.0]) color([0.8, 0.8, 0.8, 0.85]) cube([5, 5, 5]);
  translate([80.0, 80.0, 75.0]) color([0.8, 0.8, 0.8, 0.85]) cube([5, 5, 5]);
  translate([85.0, 80.0, 75.0]) color([0.8, 0.8, 0.8, 0.85]) cube([5, 5, 5]);
  translate([90.0, 80.0, 75.0]) color([0.8, 0.8, 0.8, 0.85]) cube([5, 5, 5]);
  translate([75.0, 85.0, 75.0]) color([0.8, 0.8, 0.8, 0.85]) cube([5, 5, 5]);
  translate([80.0, 85.0, 75.0]) color([0.8, 0.8, 0.8, 0.85]) cube([5, 5, 5]);
  translate([75.0, 90.0, 75.0]) color([0.8, 0.8, 0.8, 0.85]) cube([5, 5, 5]);
  translate([80.0, 90.0, 75.0]) color([0.8, 0.8, 0.8, 0.85]) cube([5, 5, 5]);
  translate([75.0, 65.0, 80.0]) color([0.8, 0.8, 0.8, 0.85]) cube([5, 5, 5]);
  translate([80.0, 65.0, 80.0]) color([0.8, 0.8, 0.8, 0.85]) cube([5, 5, 5]);
  translate([75.0, 70.0, 80.0]) color([0.8, 0.8, 0.8, 0.85]) cube([5, 5, 5]);
  translate([80.0, 70.0, 80.0]) color([0.8, 0.8, 0.8, 0.85]) cube([5, 5, 5]);
  translate([65.0, 75.0, 80.0]) color([0.8, 0.8, 0.8, 0.85]) cube([5, 5, 5]);
  translate([70.0, 75.0, 80.0]) color([0.8, 0.8, 0.8, 0.85]) cube([5, 5, 5]);
  translate([75.0, 75.0, 80.0]) color([0.8, 0.8, 0.8, 0.85]) cube([5, 5, 5]);
  translate([80.0, 75.0, 80.0]) color([0.8, 0.8, 0.8, 0.85]) cube([5, 5, 5]);
  translate([85.0, 75.0, 80.0]) color([0.8, 0.8, 0.8, 0.85]) cube([5, 5, 5]);
  translate([90.0, 75.0, 80.0]) color([0.8, 0.8, 0.8, 0.85]) cube([5, 5, 5]);
  translate([65.0, 80.0, 80.0]) color([0.8, 0.8, 0.8, 0.85]) cube([5, 5, 5]);
  translate([70.0, 80.0, 80.0]) color([0.8, 0.8, 0.8, 0.85]) cube([5, 5, 5]);
  translate([75.0, 80.0, 80.0]) color([0.8, 0.8, 0.8, 0.85]) cube([5, 5, 5]);
  translate([80.0, 80.0, 80.0]) color([0.8, 0.8, 0.8, 0.85]) cube([5, 5, 5]);
  translate([85.0, 80.0, 80.0]) color([0.8, 0.8, 0.8, 0.85]) cube([5, 5, 5]);
  translate([90.0, 80.0, 80.0]) color([0.8, 0.8, 0.8, 0.85]) cube([5, 5, 5]);
  translate([75.0, 85.0, 80.0]) color([0.8, 0.8, 0.8, 0.85]) cube([5, 5, 5]);
  translate([80.0, 85.0, 80.0]) color([0.8, 0.8, 0.8, 0.85]) cube([5, 5, 5]);
  translate([75.0, 90.0, 80.0]) color([0.8, 0.8, 0.8, 0.85]) cube([5, 5, 5]);
  translate([80.0, 90.0, 80.0]) color([0.8, 0.8, 0.8, 0.85]) cube([5, 5, 5]);
  translate([75.0, 75.0, 85.0]) color([0.8, 0.8, 0.8, 0.85]) cube([5, 5, 5]);
  translate([80.0, 75.0, 85.0]) color([0.8, 0.8, 0.8, 0.85]) cube([5, 5, 5]);
  translate([75.0, 80.0, 85.0]) color([0.8, 0.8, 0.8, 0.85]) cube([5, 5, 5]);
  translate([80.0, 80.0, 85.0]) color([0.8, 0.8, 0.8, 0.85]) cube([5, 5, 5]);
  translate([75.0, 75.0, 90.0]) color([0.8, 0.8, 0.8, 0.85]) cube([5, 5, 5]);
  translate([80.0, 75.0, 90.0]) color([0.8, 0.8, 0.8, 0.85]) cube([5, 5, 5]);
  translate([75.0, 80.0, 90.0]) color([0.8, 0.8, 0.8, 0.85]) cube([5, 5, 5]);
  translate([80.0, 80.0, 90.0]) color([0.8, 0.8, 0.8, 0.85]) cube([5, 5, 5]);
}

// 零件 F
union() {
  translate([-55.0, 0.0, 15.0]) color([0.6, 0, 1, 0.85]) cube([5, 5, 5]);
  translate([-50.0, 0.0, 15.0]) color([0.6, 0, 1, 0.85]) cube([5, 5, 5]);
  translate([-45.0, 0.0, 15.0]) color([0.6, 0, 1, 0.85]) cube([5, 5, 5]);
  translate([-55.0, 5.0, 15.0]) color([0.6, 0, 1, 0.85]) cube([5, 5, 5]);
  translate([-50.0, 5.0, 15.0]) color([0.6, 0, 1, 0.85]) cube([5, 5, 5]);
  translate([-55.0, 10.0, 15.0]) color([0.6, 0, 1, 0.85]) cube([5, 5, 5]);
  translate([-50.0, 10.0, 15.0]) color([0.6, 0, 1, 0.85]) cube([5, 5, 5]);
  translate([-55.0, 25.0, 15.0]) color([0.6, 0, 1, 0.85]) cube([5, 5, 5]);
  translate([-50.0, 25.0, 15.0]) color([0.6, 0, 1, 0.85]) cube([5, 5, 5]);
  translate([-55.0, 30.0, 15.0]) color([0.6, 0, 1, 0.85]) cube([5, 5, 5]);
  translate([-50.0, 30.0, 15.0]) color([0.6, 0, 1, 0.85]) cube([5, 5, 5]);
  translate([-55.0, 35.0, 15.0]) color([0.6, 0, 1, 0.85]) cube([5, 5, 5]);
  translate([-50.0, 35.0, 15.0]) color([0.6, 0, 1, 0.85]) cube([5, 5, 5]);
  translate([-45.0, 35.0, 15.0]) color([0.6, 0, 1, 0.85]) cube([5, 5, 5]);
  translate([-55.0, 0.0, 20.0]) color([0.6, 0, 1, 0.85]) cube([5, 5, 5]);
  translate([-50.0, 0.0, 20.0]) color([0.6, 0, 1, 0.85]) cube([5, 5, 5]);
  translate([-45.0, 0.0, 20.0]) color([0.6, 0, 1, 0.85]) cube([5, 5, 5]);
  translate([-55.0, 5.0, 20.0]) color([0.6, 0, 1, 0.85]) cube([5, 5, 5]);
  translate([-50.0, 5.0, 20.0]) color([0.6, 0, 1, 0.85]) cube([5, 5, 5]);
  translate([-55.0, 10.0, 20.0]) color([0.6, 0, 1, 0.85]) cube([5, 5, 5]);
  translate([-50.0, 10.0, 20.0]) color([0.6, 0, 1, 0.85]) cube([5, 5, 5]);
  translate([-55.0, 25.0, 20.0]) color([0.6, 0, 1, 0.85]) cube([5, 5, 5]);
  translate([-50.0, 25.0, 20.0]) color([0.6, 0, 1, 0.85]) cube([5, 5, 5]);
  translate([-55.0, 30.0, 20.0]) color([0.6, 0, 1, 0.85]) cube([5, 5, 5]);
  translate([-50.0, 30.0, 20.0]) color([0.6, 0, 1, 0.85]) cube([5, 5, 5]);
  translate([-55.0, 35.0, 20.0]) color([0.6, 0, 1, 0.85]) cube([5, 5, 5]);
  translate([-50.0, 35.0, 20.0]) color([0.6, 0, 1, 0.85]) cube([5, 5, 5]);
  translate([-45.0, 35.0, 20.0]) color([0.6, 0, 1, 0.85]) cube([5, 5, 5]);
}

// 零件 E
union() {
  translate([80.0, 0.0, 15.0]) color([1, 0.4, 0, 0.85]) cube([5, 5, 5]);
  translate([85.0, 0.0, 15.0]) color([1, 0.4, 0, 0.85]) cube([5, 5, 5]);
  translate([90.0, 0.0, 15.0]) color([1, 0.4, 0, 0.85]) cube([5, 5, 5]);
  translate([85.0, 5.0, 15.0]) color([1, 0.4, 0, 0.85]) cube([5, 5, 5]);
  translate([90.0, 5.0, 15.0]) color([1, 0.4, 0, 0.85]) cube([5, 5, 5]);
  translate([85.0, 10.0, 15.0]) color([1, 0.4, 0, 0.85]) cube([5, 5, 5]);
  translate([90.0, 10.0, 15.0]) color([1, 0.4, 0, 0.85]) cube([5, 5, 5]);
  translate([85.0, 25.0, 15.0]) color([1, 0.4, 0, 0.85]) cube([5, 5, 5]);
  translate([90.0, 25.0, 15.0]) color([1, 0.4, 0, 0.85]) cube([5, 5, 5]);
  translate([85.0, 30.0, 15.0]) color([1, 0.4, 0, 0.85]) cube([5, 5, 5]);
  translate([90.0, 30.0, 15.0]) color([1, 0.4, 0, 0.85]) cube([5, 5, 5]);
  translate([80.0, 35.0, 15.0]) color([1, 0.4, 0, 0.85]) cube([5, 5, 5]);
  translate([85.0, 35.0, 15.0]) color([1, 0.4, 0, 0.85]) cube([5, 5, 5]);
  translate([90.0, 35.0, 15.0]) color([1, 0.4, 0, 0.85]) cube([5, 5, 5]);
  translate([80.0, 0.0, 20.0]) color([1, 0.4, 0, 0.85]) cube([5, 5, 5]);
  translate([85.0, 0.0, 20.0]) color([1, 0.4, 0, 0.85]) cube([5, 5, 5]);
  translate([90.0, 0.0, 20.0]) color([1, 0.4, 0, 0.85]) cube([5, 5, 5]);
  translate([85.0, 5.0, 20.0]) color([1, 0.4, 0, 0.85]) cube([5, 5, 5]);
  translate([90.0, 5.0, 20.0]) color([1, 0.4, 0, 0.85]) cube([5, 5, 5]);
  translate([85.0, 10.0, 20.0]) color([1, 0.4, 0, 0.85]) cube([5, 5, 5]);
  translate([90.0, 10.0, 20.0]) color([1, 0.4, 0, 0.85]) cube([5, 5, 5]);
  translate([85.0, 25.0, 20.0]) color([1, 0.4, 0, 0.85]) cube([5, 5, 5]);
  translate([90.0, 25.0, 20.0]) color([1, 0.4, 0, 0.85]) cube([5, 5, 5]);
  translate([85.0, 30.0, 20.0]) color([1, 0.4, 0, 0.85]) cube([5, 5, 5]);
  translate([90.0, 30.0, 20.0]) color([1, 0.4, 0, 0.85]) cube([5, 5, 5]);
  translate([80.0, 35.0, 20.0]) color([1, 0.4, 0, 0.85]) cube([5, 5, 5]);
  translate([85.0, 35.0, 20.0]) color([1, 0.4, 0, 0.85]) cube([5, 5, 5]);
  translate([90.0, 35.0, 20.0]) color([1, 0.4, 0, 0.85]) cube([5, 5, 5]);
}

// 零件 C
union() {
  translate([0.0, 15.0, 80.0]) color([0, 0.4, 1, 0.85]) cube([5, 5, 5]);
  translate([35.0, 15.0, 80.0]) color([0, 0.4, 1, 0.85]) cube([5, 5, 5]);
  translate([0.0, 20.0, 80.0]) color([0, 0.4, 1, 0.85]) cube([5, 5, 5]);
  translate([35.0, 20.0, 80.0]) color([0, 0.4, 1, 0.85]) cube([5, 5, 5]);
  translate([0.0, 15.0, 85.0]) color([0, 0.4, 1, 0.85]) cube([5, 5, 5]);
  translate([5.0, 15.0, 85.0]) color([0, 0.4, 1, 0.85]) cube([5, 5, 5]);
  translate([10.0, 15.0, 85.0]) color([0, 0.4, 1, 0.85]) cube([5, 5, 5]);
  translate([25.0, 15.0, 85.0]) color([0, 0.4, 1, 0.85]) cube([5, 5, 5]);
  translate([30.0, 15.0, 85.0]) color([0, 0.4, 1, 0.85]) cube([5, 5, 5]);
  translate([35.0, 15.0, 85.0]) color([0, 0.4, 1, 0.85]) cube([5, 5, 5]);
  translate([0.0, 20.0, 85.0]) color([0, 0.4, 1, 0.85]) cube([5, 5, 5]);
  translate([5.0, 20.0, 85.0]) color([0, 0.4, 1, 0.85]) cube([5, 5, 5]);
  translate([10.0, 20.0, 85.0]) color([0, 0.4, 1, 0.85]) cube([5, 5, 5]);
  translate([25.0, 20.0, 85.0]) color([0, 0.4, 1, 0.85]) cube([5, 5, 5]);
  translate([30.0, 20.0, 85.0]) color([0, 0.4, 1, 0.85]) cube([5, 5, 5]);
  translate([35.0, 20.0, 85.0]) color([0, 0.4, 1, 0.85]) cube([5, 5, 5]);
  translate([0.0, 15.0, 90.0]) color([0, 0.4, 1, 0.85]) cube([5, 5, 5]);
  translate([5.0, 15.0, 90.0]) color([0, 0.4, 1, 0.85]) cube([5, 5, 5]);
  translate([10.0, 15.0, 90.0]) color([0, 0.4, 1, 0.85]) cube([5, 5, 5]);
  translate([25.0, 15.0, 90.0]) color([0, 0.4, 1, 0.85]) cube([5, 5, 5]);
  translate([30.0, 15.0, 90.0]) color([0, 0.4, 1, 0.85]) cube([5, 5, 5]);
  translate([35.0, 15.0, 90.0]) color([0, 0.4, 1, 0.85]) cube([5, 5, 5]);
  translate([0.0, 20.0, 90.0]) color([0, 0.4, 1, 0.85]) cube([5, 5, 5]);
  translate([5.0, 20.0, 90.0]) color([0, 0.4, 1, 0.85]) cube([5, 5, 5]);
  translate([10.0, 20.0, 90.0]) color([0, 0.4, 1, 0.85]) cube([5, 5, 5]);
  translate([25.0, 20.0, 90.0]) color([0, 0.4, 1, 0.85]) cube([5, 5, 5]);
  translate([30.0, 20.0, 90.0]) color([0, 0.4, 1, 0.85]) cube([5, 5, 5]);
  translate([35.0, 20.0, 90.0]) color([0, 0.4, 1, 0.85]) cube([5, 5, 5]);
}
